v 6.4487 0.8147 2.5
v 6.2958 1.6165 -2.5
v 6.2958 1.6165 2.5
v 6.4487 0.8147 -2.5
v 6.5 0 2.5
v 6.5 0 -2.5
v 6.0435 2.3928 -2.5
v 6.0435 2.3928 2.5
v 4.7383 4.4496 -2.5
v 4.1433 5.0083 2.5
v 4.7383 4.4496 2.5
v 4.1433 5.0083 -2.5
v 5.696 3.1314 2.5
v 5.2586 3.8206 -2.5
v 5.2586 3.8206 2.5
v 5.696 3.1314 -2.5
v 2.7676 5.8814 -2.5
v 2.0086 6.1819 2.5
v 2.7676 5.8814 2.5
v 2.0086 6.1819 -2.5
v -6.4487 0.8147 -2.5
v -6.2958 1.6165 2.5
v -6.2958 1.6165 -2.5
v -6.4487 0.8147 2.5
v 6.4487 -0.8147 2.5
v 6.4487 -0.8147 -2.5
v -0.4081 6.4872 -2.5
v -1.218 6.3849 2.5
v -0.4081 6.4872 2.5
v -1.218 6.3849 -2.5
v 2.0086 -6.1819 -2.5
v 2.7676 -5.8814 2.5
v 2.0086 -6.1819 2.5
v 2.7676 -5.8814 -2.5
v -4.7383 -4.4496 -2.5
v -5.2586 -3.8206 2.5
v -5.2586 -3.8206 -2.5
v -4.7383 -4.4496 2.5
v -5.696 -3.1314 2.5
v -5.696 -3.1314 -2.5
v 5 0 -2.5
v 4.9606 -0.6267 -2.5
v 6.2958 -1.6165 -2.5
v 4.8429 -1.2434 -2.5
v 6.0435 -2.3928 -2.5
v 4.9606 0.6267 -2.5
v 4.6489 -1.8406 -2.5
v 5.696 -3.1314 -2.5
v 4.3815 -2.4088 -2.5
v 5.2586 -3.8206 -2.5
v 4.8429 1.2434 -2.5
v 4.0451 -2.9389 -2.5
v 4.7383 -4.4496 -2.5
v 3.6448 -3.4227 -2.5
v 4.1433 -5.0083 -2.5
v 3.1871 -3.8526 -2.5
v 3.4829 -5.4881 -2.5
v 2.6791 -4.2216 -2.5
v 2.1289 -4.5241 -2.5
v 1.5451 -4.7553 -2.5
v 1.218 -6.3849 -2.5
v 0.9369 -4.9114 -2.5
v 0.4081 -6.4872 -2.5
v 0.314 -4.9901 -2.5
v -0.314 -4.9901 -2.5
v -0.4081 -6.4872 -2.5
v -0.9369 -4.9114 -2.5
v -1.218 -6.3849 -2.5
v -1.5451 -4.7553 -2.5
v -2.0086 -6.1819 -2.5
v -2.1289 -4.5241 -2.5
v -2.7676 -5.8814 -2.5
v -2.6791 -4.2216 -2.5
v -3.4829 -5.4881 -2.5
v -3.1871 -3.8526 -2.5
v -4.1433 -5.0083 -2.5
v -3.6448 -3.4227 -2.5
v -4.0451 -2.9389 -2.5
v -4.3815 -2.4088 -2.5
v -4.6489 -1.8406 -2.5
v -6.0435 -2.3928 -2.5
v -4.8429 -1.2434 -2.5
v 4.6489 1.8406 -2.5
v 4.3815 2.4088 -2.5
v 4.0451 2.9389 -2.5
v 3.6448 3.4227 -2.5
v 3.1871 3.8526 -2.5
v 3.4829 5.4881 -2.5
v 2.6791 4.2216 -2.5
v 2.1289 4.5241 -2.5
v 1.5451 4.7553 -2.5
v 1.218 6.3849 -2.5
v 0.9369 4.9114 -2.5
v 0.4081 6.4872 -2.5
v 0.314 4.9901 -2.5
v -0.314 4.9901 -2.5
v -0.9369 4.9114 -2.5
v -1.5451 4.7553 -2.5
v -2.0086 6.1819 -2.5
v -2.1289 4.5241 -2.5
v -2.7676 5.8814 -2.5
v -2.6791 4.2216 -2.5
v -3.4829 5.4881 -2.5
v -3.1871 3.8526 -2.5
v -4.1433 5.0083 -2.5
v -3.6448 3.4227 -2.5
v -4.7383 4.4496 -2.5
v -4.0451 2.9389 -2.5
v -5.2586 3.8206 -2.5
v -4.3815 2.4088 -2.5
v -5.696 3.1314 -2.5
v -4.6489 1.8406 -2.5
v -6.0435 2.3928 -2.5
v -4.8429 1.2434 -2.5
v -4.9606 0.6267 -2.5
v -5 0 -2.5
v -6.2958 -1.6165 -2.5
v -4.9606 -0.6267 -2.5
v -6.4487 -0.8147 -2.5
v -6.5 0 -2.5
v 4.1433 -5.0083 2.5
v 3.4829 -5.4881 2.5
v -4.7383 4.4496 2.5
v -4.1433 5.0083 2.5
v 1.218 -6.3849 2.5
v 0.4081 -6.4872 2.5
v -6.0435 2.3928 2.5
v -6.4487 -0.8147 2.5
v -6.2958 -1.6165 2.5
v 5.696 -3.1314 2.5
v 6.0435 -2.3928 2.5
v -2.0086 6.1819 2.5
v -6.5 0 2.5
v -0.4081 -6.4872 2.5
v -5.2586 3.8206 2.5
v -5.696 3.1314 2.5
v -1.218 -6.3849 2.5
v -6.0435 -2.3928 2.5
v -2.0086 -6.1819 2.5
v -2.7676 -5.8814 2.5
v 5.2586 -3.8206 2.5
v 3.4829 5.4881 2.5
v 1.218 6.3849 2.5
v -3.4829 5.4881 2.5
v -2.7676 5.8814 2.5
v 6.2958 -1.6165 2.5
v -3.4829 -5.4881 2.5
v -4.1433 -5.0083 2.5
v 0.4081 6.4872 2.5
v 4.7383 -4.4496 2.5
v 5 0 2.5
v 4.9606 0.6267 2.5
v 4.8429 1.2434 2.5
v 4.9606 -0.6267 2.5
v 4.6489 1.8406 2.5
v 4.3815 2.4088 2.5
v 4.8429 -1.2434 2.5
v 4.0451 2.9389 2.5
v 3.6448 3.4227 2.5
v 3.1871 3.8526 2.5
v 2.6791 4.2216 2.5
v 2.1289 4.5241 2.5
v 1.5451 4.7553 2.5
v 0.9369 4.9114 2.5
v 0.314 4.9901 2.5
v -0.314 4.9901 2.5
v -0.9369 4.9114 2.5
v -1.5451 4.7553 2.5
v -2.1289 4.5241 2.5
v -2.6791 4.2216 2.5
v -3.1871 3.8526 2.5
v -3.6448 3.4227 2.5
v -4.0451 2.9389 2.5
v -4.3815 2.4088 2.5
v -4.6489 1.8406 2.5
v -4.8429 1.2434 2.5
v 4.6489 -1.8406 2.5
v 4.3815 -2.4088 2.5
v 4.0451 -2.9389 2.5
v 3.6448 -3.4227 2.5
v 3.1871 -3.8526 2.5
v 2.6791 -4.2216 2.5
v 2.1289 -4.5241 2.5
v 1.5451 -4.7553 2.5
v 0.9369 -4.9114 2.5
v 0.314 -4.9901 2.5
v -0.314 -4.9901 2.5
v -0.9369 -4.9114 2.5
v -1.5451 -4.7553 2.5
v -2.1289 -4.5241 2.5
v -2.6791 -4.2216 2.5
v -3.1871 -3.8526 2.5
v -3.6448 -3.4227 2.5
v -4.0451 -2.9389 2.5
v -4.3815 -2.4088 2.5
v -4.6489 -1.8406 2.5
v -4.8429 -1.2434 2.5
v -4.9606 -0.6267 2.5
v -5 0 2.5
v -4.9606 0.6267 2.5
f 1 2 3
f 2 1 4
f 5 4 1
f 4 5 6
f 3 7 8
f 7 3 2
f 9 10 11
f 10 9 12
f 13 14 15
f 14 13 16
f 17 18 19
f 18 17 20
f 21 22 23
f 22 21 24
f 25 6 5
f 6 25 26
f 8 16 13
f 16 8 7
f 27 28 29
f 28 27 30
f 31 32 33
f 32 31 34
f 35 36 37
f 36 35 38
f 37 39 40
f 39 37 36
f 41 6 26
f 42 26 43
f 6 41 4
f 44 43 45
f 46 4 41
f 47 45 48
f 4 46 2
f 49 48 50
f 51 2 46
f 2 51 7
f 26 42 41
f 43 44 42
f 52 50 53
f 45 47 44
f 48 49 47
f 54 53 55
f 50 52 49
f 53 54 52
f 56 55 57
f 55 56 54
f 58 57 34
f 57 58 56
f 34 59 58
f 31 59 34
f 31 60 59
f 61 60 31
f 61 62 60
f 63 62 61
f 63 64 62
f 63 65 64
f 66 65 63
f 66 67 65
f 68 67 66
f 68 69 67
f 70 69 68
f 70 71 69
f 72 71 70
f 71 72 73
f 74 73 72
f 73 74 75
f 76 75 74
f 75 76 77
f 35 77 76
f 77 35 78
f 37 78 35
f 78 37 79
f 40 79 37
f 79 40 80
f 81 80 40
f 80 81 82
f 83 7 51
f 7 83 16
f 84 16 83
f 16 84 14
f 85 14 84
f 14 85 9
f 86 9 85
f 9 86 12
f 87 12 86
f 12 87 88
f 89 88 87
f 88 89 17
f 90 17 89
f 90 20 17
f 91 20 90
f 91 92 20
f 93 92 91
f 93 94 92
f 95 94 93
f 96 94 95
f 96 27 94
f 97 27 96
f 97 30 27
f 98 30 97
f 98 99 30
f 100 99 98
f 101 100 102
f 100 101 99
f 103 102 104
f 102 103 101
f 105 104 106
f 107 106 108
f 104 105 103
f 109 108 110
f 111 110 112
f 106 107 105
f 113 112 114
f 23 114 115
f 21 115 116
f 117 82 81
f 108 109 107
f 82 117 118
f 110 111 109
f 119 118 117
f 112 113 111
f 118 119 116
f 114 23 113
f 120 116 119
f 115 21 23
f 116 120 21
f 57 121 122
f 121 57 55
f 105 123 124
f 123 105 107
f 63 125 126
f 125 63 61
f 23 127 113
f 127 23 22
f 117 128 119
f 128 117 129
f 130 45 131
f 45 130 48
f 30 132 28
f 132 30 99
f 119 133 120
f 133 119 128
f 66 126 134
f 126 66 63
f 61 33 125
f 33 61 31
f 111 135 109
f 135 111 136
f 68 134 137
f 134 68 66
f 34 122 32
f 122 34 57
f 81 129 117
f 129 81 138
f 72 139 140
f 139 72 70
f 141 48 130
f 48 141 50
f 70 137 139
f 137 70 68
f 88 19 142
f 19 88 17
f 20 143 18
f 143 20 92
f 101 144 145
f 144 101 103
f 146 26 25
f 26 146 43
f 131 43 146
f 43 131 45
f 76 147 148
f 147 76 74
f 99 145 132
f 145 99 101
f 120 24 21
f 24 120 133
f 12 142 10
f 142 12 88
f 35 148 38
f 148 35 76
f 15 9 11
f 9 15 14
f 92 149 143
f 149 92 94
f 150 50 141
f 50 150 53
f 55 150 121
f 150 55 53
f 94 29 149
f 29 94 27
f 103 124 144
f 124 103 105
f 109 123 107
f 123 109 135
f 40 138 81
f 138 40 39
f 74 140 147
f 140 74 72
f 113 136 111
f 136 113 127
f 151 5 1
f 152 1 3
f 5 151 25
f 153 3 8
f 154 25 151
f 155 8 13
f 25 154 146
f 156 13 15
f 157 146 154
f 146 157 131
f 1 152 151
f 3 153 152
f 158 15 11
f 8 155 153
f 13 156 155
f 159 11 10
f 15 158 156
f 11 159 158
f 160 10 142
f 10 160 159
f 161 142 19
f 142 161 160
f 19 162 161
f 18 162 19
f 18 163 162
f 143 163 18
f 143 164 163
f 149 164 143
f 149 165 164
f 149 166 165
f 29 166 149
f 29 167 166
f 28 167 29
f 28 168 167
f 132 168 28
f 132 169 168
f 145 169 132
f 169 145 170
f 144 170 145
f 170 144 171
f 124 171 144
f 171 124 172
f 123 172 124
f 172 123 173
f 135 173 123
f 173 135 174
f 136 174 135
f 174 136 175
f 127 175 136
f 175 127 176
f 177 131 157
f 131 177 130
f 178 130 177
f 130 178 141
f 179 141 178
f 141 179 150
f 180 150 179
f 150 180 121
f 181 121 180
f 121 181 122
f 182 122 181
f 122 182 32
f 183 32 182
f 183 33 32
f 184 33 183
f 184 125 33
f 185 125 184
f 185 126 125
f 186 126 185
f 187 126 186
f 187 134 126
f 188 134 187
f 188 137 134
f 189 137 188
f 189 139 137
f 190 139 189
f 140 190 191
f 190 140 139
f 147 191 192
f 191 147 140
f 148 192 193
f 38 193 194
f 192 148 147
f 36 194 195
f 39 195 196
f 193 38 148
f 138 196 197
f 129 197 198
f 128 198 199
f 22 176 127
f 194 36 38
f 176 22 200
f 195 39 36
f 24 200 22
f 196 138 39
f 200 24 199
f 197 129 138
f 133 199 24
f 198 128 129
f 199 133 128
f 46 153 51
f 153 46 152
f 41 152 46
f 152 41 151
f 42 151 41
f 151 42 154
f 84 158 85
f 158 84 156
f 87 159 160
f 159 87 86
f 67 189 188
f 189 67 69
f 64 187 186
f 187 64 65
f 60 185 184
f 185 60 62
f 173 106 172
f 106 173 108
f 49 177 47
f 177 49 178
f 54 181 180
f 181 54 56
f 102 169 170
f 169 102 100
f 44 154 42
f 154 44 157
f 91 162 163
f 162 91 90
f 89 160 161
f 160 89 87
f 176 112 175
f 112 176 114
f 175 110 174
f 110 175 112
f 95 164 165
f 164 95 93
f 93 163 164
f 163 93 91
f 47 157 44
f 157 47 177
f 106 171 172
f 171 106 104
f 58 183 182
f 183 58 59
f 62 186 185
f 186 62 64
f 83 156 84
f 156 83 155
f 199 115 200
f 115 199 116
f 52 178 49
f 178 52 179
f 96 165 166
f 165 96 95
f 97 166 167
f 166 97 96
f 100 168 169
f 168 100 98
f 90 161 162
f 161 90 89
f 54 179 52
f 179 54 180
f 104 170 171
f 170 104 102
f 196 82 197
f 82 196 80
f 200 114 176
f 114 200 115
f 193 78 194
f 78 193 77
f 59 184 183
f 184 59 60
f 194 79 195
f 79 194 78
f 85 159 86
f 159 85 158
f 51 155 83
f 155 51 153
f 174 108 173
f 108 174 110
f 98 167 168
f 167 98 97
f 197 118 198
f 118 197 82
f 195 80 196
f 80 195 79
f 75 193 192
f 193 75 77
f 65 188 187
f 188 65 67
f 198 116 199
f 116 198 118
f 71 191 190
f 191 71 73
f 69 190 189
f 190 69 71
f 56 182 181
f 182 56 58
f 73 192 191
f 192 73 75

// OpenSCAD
$fn = 50;


difference() {
	union() {
		translate(v = [0, 0, -2.5000000000]) {
			cylinder(h = 5, r = 6.5000000000);
		}
	}
	union() {
		translate(v = [0, 0, -100.0000000000]) {
			cylinder(h = 200, r = 5.0000000000);
		}
	}
}
